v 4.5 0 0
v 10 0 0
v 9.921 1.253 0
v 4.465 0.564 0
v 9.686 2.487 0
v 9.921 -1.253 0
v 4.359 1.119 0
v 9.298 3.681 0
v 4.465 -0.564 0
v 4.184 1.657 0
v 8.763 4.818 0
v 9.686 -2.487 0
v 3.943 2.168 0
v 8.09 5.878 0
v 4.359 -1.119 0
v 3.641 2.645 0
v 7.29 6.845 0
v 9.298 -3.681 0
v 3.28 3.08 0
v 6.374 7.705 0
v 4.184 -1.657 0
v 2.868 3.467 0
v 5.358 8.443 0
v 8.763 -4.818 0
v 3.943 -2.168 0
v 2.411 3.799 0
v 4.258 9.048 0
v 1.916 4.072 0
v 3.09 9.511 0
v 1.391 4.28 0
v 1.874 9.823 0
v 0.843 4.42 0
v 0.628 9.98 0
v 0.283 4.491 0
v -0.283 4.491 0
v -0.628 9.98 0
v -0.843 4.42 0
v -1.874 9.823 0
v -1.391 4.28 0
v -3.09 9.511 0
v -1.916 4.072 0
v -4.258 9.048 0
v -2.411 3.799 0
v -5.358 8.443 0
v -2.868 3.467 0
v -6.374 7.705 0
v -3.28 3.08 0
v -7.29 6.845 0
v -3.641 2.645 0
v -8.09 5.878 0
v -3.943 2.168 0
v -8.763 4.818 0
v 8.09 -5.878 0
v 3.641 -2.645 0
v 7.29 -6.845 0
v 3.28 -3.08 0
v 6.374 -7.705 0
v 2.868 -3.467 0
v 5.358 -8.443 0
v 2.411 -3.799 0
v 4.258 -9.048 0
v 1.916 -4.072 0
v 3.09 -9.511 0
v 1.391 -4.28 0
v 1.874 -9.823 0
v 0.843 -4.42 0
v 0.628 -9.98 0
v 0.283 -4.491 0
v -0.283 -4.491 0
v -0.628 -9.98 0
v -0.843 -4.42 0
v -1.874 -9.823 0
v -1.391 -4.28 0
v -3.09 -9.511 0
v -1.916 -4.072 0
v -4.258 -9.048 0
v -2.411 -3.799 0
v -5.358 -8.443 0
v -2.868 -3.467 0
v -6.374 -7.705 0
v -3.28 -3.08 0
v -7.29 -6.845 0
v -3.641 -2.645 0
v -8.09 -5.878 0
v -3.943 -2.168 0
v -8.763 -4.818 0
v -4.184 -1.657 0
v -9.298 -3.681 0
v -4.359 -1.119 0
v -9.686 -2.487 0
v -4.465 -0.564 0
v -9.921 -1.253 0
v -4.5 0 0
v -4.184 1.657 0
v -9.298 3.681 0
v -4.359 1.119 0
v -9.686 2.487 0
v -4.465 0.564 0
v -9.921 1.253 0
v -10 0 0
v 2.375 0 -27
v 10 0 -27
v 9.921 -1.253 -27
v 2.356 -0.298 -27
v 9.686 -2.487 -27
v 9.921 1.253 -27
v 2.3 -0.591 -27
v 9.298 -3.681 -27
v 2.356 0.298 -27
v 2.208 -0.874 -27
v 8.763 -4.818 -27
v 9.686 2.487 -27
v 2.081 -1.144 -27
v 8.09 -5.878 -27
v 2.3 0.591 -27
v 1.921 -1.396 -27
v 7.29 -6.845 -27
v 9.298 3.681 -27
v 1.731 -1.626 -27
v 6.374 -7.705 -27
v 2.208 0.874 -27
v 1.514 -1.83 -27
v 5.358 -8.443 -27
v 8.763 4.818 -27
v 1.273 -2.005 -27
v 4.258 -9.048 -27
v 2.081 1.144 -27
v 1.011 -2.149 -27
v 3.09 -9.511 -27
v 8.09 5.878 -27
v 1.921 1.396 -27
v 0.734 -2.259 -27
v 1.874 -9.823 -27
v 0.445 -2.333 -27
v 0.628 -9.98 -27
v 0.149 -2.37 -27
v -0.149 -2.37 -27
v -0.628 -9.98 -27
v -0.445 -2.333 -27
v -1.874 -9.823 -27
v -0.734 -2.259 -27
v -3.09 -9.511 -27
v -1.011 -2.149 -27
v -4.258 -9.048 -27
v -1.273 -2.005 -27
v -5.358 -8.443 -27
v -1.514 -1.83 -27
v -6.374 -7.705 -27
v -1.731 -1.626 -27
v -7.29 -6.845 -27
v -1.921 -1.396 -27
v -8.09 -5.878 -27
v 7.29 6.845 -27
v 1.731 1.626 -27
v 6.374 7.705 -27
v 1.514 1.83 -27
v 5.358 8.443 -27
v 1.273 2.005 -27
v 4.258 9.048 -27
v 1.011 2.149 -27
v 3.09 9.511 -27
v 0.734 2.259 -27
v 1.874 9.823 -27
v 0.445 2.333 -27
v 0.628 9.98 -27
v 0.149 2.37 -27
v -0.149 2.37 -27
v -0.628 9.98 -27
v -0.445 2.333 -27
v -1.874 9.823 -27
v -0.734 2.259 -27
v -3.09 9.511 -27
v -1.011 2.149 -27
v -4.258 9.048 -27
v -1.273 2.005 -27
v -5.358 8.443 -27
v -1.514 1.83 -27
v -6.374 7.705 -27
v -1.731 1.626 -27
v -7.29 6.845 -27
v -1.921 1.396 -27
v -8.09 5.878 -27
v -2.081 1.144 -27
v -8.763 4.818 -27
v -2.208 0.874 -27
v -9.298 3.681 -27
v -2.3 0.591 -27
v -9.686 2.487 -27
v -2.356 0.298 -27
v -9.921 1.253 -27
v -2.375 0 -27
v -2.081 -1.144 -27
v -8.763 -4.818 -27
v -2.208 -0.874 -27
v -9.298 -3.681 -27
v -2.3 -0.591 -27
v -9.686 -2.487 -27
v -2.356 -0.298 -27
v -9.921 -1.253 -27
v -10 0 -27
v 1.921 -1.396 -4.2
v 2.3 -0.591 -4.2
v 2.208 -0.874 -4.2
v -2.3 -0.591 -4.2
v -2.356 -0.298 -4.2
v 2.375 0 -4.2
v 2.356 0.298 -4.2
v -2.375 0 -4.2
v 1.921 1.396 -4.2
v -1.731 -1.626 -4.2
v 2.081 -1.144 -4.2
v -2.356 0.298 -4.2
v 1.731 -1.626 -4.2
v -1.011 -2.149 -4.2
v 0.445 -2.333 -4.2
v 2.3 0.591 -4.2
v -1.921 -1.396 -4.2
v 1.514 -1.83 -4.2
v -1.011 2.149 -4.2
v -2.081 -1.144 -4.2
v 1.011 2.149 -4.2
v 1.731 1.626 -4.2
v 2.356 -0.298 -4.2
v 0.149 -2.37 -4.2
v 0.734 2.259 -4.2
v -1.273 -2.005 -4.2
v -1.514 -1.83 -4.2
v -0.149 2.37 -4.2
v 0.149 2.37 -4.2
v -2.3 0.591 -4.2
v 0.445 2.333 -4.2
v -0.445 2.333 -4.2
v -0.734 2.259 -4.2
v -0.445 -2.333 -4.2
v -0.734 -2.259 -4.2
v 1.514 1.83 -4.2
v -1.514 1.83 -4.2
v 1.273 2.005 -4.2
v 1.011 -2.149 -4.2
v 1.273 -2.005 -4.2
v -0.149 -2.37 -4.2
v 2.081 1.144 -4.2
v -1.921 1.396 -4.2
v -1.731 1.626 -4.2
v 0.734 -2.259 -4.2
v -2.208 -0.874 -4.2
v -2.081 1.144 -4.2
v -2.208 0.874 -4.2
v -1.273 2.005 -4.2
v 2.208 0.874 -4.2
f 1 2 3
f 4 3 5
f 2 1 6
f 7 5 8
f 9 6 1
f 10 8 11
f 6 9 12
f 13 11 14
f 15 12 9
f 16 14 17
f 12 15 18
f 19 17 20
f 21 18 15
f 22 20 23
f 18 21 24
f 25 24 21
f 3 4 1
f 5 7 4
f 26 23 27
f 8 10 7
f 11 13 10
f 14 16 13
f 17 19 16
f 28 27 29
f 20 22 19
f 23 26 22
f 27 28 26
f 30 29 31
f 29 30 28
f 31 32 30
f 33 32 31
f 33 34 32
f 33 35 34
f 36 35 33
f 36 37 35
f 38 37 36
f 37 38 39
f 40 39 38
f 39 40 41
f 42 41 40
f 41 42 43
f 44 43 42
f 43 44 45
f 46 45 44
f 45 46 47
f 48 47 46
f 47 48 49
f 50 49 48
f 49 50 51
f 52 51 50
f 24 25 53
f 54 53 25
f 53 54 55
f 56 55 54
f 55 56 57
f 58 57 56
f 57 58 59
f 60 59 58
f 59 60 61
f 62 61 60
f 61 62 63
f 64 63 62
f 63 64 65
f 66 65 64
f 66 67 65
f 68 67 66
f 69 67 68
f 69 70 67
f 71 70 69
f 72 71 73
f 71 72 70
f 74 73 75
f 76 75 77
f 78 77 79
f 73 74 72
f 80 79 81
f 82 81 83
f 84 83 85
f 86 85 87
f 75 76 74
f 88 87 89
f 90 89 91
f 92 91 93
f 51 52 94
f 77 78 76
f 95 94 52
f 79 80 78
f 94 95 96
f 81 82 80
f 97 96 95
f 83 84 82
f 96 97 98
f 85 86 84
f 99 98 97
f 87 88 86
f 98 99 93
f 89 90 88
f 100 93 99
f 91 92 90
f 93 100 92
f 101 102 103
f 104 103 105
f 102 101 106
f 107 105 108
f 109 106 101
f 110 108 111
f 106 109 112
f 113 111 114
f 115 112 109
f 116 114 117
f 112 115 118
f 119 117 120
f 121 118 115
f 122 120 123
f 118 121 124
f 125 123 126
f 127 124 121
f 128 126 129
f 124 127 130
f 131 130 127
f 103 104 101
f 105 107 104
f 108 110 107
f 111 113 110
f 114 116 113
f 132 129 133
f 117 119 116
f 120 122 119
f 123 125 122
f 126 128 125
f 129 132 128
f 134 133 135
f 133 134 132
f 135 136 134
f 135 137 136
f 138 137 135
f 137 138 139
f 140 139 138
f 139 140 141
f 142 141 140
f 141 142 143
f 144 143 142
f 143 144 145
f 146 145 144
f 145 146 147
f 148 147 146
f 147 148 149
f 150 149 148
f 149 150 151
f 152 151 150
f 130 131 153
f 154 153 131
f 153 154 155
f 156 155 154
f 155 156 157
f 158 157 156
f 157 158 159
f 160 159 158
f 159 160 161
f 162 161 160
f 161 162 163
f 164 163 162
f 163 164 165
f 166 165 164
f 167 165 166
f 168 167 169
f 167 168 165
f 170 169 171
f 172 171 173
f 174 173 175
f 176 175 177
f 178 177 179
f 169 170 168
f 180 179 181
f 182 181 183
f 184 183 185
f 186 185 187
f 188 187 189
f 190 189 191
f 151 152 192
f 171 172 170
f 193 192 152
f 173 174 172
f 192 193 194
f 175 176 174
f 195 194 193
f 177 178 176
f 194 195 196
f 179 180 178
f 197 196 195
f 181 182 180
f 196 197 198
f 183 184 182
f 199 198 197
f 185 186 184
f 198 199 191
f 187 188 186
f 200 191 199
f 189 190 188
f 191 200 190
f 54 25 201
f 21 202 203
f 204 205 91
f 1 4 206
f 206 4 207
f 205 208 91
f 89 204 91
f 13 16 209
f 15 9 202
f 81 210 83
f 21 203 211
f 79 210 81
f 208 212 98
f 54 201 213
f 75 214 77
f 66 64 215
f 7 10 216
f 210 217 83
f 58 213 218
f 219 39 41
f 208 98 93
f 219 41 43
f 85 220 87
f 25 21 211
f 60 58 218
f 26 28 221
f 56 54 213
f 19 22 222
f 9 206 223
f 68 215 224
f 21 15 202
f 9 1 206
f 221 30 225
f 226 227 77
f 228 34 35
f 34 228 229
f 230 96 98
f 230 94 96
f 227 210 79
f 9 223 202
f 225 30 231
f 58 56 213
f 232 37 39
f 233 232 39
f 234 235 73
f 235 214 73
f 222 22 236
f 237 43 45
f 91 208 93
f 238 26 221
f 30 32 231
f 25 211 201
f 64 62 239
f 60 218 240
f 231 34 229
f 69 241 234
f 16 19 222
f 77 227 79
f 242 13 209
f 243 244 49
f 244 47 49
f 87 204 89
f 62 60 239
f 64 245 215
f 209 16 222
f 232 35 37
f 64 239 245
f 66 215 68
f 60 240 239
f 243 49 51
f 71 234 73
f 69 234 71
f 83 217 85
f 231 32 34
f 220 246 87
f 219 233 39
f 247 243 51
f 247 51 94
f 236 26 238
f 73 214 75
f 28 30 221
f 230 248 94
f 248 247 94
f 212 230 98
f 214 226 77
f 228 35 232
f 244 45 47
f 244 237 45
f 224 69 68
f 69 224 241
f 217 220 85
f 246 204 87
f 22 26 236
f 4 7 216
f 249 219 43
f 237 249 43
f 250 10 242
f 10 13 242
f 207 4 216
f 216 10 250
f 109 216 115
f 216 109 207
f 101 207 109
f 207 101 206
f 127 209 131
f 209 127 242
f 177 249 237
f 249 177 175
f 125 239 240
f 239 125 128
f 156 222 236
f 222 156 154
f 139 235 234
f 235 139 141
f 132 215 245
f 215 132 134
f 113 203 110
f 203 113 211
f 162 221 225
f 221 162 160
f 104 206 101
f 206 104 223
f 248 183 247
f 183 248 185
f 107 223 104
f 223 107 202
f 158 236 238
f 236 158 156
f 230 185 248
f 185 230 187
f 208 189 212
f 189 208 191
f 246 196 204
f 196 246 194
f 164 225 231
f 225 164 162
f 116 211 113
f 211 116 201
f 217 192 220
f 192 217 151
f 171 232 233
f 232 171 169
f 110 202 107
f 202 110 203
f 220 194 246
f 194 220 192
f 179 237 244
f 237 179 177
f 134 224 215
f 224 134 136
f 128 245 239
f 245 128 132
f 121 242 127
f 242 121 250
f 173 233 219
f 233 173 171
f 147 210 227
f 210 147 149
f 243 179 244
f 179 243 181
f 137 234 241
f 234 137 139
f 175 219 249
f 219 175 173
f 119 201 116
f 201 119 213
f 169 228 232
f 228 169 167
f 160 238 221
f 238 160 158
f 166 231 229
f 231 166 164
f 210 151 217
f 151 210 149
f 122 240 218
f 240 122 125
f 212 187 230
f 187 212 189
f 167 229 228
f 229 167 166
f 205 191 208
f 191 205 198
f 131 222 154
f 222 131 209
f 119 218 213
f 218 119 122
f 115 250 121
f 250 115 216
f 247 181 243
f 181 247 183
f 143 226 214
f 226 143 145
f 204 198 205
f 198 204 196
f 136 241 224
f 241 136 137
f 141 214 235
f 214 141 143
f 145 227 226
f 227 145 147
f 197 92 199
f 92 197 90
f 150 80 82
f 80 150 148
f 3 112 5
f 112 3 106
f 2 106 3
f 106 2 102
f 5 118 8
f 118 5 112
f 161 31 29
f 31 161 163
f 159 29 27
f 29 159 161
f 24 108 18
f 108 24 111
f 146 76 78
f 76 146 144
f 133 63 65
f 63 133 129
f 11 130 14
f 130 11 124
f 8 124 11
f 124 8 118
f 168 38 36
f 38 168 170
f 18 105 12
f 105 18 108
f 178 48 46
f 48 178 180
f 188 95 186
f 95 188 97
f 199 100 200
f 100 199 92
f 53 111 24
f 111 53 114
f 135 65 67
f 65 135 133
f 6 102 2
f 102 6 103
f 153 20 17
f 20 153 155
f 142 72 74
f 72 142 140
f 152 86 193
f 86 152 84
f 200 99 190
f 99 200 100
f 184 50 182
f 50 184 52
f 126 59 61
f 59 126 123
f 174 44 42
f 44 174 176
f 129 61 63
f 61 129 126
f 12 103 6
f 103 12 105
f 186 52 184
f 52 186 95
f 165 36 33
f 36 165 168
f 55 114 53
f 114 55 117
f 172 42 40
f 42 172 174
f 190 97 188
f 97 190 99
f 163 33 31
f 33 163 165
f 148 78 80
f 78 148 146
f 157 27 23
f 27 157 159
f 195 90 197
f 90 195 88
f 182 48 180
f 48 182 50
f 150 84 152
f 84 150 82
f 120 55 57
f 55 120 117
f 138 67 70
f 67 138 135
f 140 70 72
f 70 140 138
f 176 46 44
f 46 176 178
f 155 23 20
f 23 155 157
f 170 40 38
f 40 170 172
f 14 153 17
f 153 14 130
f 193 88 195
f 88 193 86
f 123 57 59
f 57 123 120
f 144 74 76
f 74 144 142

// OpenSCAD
$fn = 50;


difference() {
	union() {
		translate(v = [0, 0, -27.0000000000]) {
			cylinder(h = 27, r = 10.0000000000);
		}
		cylinder(h = 0, r = 16.0000000000);
	}
	union() {
		translate(v = [0, 0, 0]) {
			rotate(a = [0, 0, 0]) {
				difference() {
					union() {
						#translate(v = [0, 0, -27.0000000000]) {
							cylinder(h = 27, r = 2.2500000000);
						}
						#translate(v = [0, 0, -4.2000000000]) {
							cylinder(h = 4.2000000000, r = 10.0000000000, r1 = 2.3750000000, r2 = 4.5000000000);
						}
						#translate(v = [0, 0, -27.0000000000]) {
							cylinder(h = 27, r = 2.3750000000);
						}
						#translate(v = [0, 0, -27.0000000000]) {
							cylinder(h = 27, r = 2.2500000000);
						}
					}
					union();
				}
			}
		}
	}
}
